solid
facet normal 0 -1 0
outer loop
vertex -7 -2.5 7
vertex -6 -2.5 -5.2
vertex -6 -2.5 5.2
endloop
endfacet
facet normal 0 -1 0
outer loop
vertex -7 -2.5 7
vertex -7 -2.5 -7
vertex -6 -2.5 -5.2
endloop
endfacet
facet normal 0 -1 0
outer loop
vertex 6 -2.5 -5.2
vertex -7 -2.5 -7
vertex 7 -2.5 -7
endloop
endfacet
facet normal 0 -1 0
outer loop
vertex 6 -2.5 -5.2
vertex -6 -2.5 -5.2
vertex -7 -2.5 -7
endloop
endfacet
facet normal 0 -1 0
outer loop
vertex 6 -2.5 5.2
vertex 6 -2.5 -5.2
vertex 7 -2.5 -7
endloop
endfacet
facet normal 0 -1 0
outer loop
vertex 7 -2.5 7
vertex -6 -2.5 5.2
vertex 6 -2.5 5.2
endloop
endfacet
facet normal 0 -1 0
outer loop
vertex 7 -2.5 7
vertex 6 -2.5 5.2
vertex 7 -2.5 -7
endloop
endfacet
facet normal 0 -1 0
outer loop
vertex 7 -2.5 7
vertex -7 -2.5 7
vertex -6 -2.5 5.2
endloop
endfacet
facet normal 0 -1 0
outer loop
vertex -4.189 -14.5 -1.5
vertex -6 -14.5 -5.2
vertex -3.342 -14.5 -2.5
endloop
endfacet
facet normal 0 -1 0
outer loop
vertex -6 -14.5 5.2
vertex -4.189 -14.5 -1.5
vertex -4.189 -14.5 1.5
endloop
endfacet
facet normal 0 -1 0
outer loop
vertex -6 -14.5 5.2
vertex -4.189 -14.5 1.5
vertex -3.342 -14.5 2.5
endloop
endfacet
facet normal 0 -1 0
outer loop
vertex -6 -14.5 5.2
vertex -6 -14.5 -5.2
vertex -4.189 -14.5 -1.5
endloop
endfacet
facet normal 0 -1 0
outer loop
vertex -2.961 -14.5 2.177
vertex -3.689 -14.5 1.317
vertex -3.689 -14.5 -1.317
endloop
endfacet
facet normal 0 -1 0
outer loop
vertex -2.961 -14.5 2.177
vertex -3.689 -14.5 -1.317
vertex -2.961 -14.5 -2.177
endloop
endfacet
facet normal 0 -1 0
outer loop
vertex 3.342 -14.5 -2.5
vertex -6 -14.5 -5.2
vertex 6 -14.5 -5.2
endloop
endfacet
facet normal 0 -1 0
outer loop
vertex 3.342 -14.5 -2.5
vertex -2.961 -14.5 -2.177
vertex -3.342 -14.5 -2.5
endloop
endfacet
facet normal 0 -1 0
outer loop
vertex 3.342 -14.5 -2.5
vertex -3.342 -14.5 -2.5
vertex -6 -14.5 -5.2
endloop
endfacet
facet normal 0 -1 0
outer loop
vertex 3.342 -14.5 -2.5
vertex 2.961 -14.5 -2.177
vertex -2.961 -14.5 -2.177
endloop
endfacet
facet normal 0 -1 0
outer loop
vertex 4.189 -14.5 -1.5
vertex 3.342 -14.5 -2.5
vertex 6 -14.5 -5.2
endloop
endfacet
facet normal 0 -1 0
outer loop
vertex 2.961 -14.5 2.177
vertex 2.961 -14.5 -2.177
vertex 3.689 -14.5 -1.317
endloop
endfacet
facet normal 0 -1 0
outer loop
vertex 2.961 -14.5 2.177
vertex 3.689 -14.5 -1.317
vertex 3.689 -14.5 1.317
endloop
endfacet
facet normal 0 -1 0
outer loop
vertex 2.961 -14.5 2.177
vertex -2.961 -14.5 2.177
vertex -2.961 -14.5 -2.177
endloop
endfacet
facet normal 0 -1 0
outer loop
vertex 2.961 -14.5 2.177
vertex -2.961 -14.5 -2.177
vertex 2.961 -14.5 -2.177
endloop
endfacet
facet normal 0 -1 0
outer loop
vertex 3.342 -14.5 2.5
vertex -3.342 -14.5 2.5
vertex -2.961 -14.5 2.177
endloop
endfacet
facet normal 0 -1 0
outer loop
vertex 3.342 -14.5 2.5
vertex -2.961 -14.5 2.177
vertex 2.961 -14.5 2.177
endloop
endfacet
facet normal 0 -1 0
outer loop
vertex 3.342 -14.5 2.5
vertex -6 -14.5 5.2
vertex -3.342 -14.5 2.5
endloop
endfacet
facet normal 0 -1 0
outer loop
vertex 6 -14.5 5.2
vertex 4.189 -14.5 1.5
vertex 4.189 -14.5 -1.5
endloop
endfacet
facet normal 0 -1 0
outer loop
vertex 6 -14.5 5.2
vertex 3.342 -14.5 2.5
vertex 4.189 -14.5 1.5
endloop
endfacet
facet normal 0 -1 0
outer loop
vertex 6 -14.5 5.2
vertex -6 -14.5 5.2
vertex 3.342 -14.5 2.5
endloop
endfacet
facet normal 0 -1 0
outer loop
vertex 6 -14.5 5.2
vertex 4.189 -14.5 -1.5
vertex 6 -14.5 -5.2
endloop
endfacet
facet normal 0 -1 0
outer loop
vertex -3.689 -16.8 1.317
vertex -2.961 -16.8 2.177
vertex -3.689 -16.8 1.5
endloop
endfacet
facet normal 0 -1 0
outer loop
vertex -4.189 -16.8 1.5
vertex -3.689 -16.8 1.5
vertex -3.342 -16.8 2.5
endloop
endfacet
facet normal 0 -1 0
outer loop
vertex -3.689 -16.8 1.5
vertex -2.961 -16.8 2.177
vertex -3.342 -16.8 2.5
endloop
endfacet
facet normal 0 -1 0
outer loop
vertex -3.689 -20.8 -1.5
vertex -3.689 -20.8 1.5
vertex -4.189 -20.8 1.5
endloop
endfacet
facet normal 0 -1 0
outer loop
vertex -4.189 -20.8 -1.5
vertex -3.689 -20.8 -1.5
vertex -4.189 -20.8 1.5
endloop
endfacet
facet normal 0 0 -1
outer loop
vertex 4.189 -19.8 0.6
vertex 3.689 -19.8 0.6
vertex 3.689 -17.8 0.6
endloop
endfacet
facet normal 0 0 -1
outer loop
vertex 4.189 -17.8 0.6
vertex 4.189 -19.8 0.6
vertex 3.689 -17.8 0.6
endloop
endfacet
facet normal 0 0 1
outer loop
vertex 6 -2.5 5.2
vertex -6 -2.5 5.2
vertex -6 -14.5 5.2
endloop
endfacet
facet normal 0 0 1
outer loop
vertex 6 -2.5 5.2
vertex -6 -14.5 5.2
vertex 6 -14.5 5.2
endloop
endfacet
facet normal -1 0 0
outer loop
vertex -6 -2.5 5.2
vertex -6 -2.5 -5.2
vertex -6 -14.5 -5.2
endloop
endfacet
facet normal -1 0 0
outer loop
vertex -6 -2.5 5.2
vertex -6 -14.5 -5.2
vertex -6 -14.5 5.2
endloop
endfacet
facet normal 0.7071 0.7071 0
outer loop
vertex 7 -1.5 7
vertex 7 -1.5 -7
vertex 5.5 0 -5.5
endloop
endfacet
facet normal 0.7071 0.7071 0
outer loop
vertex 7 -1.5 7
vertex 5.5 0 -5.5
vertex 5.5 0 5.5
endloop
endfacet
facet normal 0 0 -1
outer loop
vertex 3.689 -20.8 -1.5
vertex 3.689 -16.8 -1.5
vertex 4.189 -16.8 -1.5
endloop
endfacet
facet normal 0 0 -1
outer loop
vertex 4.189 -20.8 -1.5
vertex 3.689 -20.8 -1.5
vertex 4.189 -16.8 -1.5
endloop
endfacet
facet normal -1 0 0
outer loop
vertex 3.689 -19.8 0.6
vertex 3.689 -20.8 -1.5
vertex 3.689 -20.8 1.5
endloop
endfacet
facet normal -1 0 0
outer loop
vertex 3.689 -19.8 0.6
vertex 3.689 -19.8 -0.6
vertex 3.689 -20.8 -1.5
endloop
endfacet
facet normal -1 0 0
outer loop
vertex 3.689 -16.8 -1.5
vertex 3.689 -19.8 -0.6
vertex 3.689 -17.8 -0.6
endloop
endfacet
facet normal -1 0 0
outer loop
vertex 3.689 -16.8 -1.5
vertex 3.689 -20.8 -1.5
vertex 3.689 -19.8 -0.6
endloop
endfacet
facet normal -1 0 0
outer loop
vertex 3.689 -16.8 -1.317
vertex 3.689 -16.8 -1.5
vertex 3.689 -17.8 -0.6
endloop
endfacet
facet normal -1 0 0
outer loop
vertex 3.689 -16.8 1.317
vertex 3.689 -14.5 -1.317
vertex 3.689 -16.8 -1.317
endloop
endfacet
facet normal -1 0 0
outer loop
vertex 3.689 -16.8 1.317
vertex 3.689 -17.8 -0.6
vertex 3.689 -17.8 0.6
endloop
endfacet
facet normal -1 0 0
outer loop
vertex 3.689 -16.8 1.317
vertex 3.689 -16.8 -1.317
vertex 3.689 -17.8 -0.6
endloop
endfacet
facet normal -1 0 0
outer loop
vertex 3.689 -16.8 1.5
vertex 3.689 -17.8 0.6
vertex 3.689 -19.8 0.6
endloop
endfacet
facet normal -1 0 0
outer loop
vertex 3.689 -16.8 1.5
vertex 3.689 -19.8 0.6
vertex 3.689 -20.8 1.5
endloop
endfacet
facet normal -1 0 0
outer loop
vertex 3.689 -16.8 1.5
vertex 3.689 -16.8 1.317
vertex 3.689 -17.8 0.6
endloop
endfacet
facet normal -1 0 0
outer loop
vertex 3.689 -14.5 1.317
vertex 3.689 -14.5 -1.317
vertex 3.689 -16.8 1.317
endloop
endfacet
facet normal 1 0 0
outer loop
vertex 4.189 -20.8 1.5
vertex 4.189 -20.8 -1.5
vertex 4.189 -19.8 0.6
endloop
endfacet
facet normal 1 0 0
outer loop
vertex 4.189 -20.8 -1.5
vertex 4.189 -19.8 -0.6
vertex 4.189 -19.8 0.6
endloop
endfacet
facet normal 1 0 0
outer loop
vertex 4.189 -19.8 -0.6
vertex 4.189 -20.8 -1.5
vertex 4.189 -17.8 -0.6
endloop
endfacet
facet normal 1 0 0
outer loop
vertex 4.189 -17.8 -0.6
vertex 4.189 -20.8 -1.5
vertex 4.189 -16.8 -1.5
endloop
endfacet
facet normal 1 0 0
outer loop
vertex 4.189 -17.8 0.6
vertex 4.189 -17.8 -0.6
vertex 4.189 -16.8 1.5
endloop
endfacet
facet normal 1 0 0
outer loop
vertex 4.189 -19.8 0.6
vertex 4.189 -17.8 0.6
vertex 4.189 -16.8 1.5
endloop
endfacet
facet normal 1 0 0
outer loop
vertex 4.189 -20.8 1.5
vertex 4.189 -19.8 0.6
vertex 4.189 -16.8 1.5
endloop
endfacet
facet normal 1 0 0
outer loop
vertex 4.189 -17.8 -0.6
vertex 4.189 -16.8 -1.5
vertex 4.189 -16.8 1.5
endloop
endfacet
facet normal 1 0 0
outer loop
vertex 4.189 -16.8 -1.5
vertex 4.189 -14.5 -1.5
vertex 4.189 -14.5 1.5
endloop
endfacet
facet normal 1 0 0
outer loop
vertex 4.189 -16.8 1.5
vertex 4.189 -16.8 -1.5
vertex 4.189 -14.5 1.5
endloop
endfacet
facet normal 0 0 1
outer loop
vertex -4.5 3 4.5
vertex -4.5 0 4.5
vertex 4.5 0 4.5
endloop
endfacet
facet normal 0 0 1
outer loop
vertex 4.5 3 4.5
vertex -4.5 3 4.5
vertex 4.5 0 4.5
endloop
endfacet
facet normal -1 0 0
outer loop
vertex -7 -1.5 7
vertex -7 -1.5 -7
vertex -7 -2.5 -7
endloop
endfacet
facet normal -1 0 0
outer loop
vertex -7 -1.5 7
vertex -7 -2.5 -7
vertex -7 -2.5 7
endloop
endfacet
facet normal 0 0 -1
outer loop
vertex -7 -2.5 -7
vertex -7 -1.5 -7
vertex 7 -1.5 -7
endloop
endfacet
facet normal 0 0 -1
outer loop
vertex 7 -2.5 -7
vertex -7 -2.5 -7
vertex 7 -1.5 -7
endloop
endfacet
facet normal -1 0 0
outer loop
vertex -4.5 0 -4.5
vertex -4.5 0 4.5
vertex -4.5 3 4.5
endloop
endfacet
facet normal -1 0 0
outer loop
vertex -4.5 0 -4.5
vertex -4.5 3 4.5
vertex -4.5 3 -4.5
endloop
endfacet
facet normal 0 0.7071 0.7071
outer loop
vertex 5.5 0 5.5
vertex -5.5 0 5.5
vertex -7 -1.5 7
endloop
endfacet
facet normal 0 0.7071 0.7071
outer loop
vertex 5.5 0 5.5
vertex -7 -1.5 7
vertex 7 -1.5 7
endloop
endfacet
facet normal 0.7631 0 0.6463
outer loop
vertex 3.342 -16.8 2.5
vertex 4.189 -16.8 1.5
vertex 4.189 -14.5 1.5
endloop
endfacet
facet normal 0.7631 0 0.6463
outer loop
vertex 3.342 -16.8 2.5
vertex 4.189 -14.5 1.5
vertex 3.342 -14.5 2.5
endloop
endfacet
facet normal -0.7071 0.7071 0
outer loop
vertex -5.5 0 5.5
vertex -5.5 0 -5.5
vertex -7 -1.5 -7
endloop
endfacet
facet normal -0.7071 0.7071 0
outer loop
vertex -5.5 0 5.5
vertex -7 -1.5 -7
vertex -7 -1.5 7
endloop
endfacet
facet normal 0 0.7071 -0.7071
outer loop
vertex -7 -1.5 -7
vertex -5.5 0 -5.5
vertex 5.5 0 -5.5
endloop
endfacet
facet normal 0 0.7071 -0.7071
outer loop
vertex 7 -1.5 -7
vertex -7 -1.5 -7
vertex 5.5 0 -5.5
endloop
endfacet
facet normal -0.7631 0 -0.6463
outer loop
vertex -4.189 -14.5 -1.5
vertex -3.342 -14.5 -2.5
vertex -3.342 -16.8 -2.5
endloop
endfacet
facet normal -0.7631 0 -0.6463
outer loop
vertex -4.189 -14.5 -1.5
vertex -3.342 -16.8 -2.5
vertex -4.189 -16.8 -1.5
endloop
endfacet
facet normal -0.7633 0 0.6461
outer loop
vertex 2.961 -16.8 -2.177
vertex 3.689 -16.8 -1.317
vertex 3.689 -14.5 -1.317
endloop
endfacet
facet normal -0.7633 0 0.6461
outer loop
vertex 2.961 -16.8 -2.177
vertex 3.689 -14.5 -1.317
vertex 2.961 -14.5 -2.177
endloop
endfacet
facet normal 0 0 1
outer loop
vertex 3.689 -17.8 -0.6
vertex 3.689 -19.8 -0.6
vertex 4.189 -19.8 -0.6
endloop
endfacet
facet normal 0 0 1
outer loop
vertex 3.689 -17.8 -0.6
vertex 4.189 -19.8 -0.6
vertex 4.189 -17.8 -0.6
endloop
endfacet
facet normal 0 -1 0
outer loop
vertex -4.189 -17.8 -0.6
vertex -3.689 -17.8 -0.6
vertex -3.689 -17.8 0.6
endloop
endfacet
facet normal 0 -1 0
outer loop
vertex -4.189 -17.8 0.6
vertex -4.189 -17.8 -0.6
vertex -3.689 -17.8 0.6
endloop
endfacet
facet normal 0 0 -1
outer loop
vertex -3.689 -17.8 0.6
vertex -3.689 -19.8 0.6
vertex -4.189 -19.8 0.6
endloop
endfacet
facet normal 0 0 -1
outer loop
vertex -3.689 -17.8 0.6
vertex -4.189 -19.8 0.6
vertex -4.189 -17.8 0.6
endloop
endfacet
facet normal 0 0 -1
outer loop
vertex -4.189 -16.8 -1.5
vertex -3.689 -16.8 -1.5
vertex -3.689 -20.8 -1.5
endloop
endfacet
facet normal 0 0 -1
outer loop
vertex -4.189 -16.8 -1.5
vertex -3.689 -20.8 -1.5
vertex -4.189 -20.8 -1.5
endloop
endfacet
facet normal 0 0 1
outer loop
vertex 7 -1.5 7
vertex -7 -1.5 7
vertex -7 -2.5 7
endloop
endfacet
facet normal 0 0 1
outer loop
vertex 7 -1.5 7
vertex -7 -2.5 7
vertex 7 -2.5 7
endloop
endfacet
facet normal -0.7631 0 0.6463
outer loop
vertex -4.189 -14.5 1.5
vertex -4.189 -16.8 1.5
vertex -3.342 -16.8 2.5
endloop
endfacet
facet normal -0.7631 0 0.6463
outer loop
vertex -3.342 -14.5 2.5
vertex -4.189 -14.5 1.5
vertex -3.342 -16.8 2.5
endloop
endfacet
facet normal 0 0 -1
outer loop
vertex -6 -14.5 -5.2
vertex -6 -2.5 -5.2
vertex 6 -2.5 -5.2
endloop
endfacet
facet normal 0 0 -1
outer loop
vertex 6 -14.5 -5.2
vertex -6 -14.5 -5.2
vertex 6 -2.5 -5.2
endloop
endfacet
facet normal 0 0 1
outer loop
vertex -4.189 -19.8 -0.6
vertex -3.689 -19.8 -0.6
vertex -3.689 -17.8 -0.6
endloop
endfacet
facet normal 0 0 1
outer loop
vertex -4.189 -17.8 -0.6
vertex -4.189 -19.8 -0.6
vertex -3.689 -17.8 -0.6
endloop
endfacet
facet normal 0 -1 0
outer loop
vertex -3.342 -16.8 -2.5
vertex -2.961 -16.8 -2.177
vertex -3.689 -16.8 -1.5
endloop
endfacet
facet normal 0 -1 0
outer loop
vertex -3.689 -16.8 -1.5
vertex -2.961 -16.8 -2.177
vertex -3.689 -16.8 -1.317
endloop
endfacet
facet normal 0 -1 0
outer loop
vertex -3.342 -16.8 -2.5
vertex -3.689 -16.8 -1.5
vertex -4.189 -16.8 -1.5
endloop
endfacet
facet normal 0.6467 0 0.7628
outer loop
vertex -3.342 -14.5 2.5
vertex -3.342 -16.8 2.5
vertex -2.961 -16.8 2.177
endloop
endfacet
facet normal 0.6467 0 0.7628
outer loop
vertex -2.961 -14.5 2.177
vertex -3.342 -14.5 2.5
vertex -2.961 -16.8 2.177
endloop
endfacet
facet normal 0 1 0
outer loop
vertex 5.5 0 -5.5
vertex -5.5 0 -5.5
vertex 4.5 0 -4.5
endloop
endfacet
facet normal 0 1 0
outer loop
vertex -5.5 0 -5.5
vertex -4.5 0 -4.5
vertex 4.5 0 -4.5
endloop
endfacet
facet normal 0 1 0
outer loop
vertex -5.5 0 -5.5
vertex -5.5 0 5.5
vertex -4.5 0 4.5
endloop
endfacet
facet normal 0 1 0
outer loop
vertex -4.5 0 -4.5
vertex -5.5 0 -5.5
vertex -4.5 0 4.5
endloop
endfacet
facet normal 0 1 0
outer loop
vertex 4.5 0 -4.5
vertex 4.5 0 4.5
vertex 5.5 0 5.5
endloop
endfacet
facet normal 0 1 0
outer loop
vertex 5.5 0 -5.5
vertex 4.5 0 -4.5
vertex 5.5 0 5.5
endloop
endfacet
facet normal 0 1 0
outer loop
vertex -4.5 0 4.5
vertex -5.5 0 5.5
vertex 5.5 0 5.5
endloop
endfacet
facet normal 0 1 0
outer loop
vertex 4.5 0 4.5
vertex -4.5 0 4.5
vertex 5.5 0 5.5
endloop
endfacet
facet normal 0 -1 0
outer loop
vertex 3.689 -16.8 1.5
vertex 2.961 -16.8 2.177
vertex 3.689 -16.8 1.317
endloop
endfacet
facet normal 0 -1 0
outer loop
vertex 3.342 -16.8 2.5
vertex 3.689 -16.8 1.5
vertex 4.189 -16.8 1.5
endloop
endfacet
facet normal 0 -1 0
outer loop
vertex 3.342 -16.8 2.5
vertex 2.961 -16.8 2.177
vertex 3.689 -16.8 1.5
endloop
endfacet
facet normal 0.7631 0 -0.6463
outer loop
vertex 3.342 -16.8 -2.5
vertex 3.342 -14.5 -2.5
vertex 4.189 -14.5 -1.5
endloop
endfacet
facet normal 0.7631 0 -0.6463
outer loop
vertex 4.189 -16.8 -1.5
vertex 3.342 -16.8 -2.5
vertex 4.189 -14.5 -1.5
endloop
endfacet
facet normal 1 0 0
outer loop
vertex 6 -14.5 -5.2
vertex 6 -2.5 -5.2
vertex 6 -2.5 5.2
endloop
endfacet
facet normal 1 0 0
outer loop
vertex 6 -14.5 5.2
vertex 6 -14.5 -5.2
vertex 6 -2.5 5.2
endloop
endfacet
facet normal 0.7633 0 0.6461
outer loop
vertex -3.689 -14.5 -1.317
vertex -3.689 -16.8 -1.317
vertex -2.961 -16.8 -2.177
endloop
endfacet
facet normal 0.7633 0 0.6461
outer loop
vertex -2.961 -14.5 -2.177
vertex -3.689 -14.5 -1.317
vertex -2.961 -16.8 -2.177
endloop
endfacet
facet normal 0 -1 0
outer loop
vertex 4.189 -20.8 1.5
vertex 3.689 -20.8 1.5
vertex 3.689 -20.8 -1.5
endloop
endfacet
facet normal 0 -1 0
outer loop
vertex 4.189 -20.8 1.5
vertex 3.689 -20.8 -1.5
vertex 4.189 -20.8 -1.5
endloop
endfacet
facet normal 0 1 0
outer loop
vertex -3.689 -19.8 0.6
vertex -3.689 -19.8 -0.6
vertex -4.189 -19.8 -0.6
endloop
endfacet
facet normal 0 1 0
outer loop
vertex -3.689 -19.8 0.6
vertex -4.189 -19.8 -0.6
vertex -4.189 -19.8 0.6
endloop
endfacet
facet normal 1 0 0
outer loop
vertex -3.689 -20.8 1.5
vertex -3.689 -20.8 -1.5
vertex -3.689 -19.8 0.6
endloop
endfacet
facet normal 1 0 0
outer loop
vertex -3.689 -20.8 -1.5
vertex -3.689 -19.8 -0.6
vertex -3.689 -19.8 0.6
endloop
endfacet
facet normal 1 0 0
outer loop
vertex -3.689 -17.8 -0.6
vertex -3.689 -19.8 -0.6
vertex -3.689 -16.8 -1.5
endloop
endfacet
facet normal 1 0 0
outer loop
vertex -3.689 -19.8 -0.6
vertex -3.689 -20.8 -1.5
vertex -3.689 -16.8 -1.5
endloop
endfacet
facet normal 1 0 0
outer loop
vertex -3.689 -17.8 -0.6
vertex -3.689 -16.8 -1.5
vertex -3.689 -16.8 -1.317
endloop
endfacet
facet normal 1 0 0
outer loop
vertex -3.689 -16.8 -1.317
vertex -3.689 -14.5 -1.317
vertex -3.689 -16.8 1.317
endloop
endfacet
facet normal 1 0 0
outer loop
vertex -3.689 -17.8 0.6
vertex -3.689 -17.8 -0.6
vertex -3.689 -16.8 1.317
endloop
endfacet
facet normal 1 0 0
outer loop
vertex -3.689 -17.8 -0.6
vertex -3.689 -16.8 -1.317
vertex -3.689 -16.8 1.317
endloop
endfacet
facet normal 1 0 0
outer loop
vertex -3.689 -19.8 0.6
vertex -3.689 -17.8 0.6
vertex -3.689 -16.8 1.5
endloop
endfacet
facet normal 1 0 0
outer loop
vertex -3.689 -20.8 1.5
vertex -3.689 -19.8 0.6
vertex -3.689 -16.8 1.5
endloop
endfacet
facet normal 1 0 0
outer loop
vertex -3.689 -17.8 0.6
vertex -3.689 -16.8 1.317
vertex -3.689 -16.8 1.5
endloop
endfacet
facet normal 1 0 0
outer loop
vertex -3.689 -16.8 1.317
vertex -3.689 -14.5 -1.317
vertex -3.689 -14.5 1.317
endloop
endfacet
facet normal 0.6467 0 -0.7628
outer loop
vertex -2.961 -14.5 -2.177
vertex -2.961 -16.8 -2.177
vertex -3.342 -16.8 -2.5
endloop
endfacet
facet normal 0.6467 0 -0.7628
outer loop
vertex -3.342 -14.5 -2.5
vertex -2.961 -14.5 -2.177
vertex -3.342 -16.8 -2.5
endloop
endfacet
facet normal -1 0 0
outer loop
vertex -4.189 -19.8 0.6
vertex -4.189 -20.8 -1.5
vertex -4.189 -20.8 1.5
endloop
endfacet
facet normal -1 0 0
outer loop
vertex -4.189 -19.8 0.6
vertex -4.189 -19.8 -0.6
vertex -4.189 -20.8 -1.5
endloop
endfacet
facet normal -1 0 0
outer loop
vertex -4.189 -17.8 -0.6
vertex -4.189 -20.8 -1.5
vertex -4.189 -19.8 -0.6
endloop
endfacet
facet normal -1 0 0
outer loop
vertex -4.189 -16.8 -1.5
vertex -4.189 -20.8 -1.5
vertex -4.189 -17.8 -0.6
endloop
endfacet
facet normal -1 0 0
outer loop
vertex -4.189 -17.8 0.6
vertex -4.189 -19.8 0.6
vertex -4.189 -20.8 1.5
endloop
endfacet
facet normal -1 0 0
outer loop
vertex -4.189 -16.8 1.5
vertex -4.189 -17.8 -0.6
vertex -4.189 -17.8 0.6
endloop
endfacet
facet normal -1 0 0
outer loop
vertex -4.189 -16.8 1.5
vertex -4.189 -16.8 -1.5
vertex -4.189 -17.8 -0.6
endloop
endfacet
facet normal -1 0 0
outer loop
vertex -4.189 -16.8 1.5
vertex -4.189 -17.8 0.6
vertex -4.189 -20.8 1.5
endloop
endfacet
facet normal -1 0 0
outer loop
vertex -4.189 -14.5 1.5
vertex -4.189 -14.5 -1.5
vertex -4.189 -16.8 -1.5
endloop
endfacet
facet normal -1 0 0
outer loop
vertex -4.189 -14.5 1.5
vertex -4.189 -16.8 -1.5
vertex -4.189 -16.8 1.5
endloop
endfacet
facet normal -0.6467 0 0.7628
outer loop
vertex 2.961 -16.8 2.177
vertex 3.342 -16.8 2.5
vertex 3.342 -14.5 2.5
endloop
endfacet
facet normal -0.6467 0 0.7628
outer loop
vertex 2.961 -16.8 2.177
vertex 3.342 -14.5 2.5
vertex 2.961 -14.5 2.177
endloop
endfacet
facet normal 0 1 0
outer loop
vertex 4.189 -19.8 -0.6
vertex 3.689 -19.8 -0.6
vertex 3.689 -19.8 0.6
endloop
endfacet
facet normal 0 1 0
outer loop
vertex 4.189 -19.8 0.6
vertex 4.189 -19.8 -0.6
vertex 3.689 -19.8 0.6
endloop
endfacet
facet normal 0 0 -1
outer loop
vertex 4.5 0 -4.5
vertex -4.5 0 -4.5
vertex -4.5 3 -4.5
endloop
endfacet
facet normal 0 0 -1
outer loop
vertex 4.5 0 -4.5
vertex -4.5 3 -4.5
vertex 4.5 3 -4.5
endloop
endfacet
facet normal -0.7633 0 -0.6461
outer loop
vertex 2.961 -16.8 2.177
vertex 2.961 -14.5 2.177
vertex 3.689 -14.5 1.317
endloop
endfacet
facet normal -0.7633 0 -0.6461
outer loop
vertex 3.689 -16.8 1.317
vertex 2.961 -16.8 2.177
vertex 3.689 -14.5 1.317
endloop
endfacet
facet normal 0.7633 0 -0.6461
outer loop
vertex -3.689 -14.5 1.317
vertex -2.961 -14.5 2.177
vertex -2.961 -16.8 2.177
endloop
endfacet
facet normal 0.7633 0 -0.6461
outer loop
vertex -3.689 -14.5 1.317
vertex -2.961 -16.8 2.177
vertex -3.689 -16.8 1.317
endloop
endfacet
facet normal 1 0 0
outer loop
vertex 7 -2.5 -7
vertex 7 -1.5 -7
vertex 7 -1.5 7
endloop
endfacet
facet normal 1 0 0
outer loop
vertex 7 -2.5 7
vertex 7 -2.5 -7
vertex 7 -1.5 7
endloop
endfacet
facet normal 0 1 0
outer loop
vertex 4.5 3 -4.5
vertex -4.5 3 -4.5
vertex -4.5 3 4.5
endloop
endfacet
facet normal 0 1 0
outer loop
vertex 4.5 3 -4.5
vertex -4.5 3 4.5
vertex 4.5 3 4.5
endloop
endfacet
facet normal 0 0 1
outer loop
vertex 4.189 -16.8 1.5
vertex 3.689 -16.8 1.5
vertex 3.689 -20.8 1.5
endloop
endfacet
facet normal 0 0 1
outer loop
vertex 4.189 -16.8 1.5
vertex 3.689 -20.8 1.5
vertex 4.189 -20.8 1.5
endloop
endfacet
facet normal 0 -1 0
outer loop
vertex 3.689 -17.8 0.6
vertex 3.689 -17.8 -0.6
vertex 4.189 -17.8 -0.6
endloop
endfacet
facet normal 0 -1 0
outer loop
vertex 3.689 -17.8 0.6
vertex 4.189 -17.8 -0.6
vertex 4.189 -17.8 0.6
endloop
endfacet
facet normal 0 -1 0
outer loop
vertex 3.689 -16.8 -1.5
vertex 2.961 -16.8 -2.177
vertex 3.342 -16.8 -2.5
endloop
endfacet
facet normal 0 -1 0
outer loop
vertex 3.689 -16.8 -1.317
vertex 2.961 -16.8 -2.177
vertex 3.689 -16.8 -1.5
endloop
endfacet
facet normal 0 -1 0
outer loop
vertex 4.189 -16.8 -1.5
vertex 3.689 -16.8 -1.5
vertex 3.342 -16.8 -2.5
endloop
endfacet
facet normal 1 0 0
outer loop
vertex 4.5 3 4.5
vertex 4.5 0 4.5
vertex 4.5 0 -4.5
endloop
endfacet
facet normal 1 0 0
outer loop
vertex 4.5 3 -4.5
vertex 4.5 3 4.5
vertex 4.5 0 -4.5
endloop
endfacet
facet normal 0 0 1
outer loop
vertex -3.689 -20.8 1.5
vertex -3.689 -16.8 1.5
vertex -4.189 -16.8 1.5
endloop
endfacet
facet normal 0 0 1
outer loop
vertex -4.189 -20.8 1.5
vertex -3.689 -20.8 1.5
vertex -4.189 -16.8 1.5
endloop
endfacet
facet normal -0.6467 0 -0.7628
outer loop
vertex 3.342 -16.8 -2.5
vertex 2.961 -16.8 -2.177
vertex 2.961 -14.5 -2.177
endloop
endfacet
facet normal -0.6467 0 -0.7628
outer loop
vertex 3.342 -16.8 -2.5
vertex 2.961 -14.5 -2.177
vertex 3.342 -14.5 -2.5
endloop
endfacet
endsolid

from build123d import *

# Parameters (mm, degrees)
SKETCH_1_W          = 9
SKETCH_1_H          = 9
EXTRUDE_1_DEPTH     = 3
SKETCH_2_W          = 14
SKETCH_2_H          = 14
EXTRUDE_2_DEPTH     = 2.5
CHAMFER_1_SIZE      = 1.5
SKETCH_3_W          = 12
SKETCH_3_H          = 10.4
EXTRUDE_3_DEPTH     = 12
EXTRUDE_4_DEPTH     = 2.3
SKETCH_5_W          = 0.5
SKETCH_5_H          = 3
EXTRUDE_5_DEPTH     = 4
SKETCH_6_W          = 1.2
SKETCH_6_H          = 2
CUT_EXTRUDE_1_DEPTH = 4


with BuildPart() as part:
    # Эскиз1 → Бобышка-Вытянуть1 (new body)
    with BuildSketch(Plane(origin=(0, 0, 0), x_dir=(1, 0, 0), z_dir=(0, 1, 0))):
        Rectangle(SKETCH_1_W, SKETCH_1_H)
    extrude(amount=EXTRUDE_1_DEPTH)

    # Эскиз2 → Бобышка-Вытянуть2 (add)
    with BuildSketch(Plane.XZ):
        Rectangle(SKETCH_2_W, SKETCH_2_H)
    extrude(amount=EXTRUDE_2_DEPTH)

    # Фаска1
    chamfer_1_edges = [part.edges().sort_by_distance(p)[0] for p in [
        (7, 0, 0),
        (0, 0, 7),
        (-7, 0, 0),
        (0, 0, -7),
    ]]
    chamfer(chamfer_1_edges, length=CHAMFER_1_SIZE)

    # Эскиз3 → Бобышка-Вытянуть3 (add)
    with BuildSketch(Plane.XZ.offset(2.5)):
        Rectangle(SKETCH_3_W, SKETCH_3_H)
    extrude(amount=EXTRUDE_3_DEPTH)

    # Эскиз4 → Бобышка-Вытянуть4 (add)
    with BuildSketch(Plane.XZ.offset(14.5)):
        Polygon((4.188675038, -1.5), (4.188675038, 1.5), (3.342315947, 2.5), (2.960661433, 2.176983233), (3.688675038, 1.316812163), (3.688675038, -1.316812163), (2.960661433, -2.176983233), (3.342315947, -2.5), align=None)
    extrude_4 = extrude(amount=EXTRUDE_4_DEPTH)

    # Эскиз5 → Бобышка-Вытянуть5 (add)
    with BuildSketch(Plane.XZ.offset(16.8)):
        with Locations((3.938675038, 0)):
            Rectangle(SKETCH_5_W, SKETCH_5_H)
    extrude_5 = extrude(amount=EXTRUDE_5_DEPTH)

    # Эскиз6 → Вырез-Вытянуть1 (cut)
    with BuildSketch(Plane.ZY.offset(-3.688675038)):
        with Locations((0, -18.8)):
            Rectangle(SKETCH_6_W, SKETCH_6_H)
    cut_extrude_1 = extrude(amount=-CUT_EXTRUDE_1_DEPTH, mode=Mode.SUBTRACT)

    # Зеркальное отражение1: Бобышка-Вытянуть4, Бобышка-Вытянуть5, Вырез-Вытянуть1 across plane
    add(extrude_4.mirror(Plane(origin=(0, 0, 0), x_dir=(0, 0, 1), z_dir=(1, 0, 0))))
    add(extrude_5.mirror(Plane(origin=(0, 0, 0), x_dir=(0, 0, 1), z_dir=(1, 0, 0))))
    add(cut_extrude_1.mirror(Plane(origin=(0, 0, 0), x_dir=(0, 0, 1), z_dir=(1, 0, 0))), mode=Mode.SUBTRACT)


solid = part.part
